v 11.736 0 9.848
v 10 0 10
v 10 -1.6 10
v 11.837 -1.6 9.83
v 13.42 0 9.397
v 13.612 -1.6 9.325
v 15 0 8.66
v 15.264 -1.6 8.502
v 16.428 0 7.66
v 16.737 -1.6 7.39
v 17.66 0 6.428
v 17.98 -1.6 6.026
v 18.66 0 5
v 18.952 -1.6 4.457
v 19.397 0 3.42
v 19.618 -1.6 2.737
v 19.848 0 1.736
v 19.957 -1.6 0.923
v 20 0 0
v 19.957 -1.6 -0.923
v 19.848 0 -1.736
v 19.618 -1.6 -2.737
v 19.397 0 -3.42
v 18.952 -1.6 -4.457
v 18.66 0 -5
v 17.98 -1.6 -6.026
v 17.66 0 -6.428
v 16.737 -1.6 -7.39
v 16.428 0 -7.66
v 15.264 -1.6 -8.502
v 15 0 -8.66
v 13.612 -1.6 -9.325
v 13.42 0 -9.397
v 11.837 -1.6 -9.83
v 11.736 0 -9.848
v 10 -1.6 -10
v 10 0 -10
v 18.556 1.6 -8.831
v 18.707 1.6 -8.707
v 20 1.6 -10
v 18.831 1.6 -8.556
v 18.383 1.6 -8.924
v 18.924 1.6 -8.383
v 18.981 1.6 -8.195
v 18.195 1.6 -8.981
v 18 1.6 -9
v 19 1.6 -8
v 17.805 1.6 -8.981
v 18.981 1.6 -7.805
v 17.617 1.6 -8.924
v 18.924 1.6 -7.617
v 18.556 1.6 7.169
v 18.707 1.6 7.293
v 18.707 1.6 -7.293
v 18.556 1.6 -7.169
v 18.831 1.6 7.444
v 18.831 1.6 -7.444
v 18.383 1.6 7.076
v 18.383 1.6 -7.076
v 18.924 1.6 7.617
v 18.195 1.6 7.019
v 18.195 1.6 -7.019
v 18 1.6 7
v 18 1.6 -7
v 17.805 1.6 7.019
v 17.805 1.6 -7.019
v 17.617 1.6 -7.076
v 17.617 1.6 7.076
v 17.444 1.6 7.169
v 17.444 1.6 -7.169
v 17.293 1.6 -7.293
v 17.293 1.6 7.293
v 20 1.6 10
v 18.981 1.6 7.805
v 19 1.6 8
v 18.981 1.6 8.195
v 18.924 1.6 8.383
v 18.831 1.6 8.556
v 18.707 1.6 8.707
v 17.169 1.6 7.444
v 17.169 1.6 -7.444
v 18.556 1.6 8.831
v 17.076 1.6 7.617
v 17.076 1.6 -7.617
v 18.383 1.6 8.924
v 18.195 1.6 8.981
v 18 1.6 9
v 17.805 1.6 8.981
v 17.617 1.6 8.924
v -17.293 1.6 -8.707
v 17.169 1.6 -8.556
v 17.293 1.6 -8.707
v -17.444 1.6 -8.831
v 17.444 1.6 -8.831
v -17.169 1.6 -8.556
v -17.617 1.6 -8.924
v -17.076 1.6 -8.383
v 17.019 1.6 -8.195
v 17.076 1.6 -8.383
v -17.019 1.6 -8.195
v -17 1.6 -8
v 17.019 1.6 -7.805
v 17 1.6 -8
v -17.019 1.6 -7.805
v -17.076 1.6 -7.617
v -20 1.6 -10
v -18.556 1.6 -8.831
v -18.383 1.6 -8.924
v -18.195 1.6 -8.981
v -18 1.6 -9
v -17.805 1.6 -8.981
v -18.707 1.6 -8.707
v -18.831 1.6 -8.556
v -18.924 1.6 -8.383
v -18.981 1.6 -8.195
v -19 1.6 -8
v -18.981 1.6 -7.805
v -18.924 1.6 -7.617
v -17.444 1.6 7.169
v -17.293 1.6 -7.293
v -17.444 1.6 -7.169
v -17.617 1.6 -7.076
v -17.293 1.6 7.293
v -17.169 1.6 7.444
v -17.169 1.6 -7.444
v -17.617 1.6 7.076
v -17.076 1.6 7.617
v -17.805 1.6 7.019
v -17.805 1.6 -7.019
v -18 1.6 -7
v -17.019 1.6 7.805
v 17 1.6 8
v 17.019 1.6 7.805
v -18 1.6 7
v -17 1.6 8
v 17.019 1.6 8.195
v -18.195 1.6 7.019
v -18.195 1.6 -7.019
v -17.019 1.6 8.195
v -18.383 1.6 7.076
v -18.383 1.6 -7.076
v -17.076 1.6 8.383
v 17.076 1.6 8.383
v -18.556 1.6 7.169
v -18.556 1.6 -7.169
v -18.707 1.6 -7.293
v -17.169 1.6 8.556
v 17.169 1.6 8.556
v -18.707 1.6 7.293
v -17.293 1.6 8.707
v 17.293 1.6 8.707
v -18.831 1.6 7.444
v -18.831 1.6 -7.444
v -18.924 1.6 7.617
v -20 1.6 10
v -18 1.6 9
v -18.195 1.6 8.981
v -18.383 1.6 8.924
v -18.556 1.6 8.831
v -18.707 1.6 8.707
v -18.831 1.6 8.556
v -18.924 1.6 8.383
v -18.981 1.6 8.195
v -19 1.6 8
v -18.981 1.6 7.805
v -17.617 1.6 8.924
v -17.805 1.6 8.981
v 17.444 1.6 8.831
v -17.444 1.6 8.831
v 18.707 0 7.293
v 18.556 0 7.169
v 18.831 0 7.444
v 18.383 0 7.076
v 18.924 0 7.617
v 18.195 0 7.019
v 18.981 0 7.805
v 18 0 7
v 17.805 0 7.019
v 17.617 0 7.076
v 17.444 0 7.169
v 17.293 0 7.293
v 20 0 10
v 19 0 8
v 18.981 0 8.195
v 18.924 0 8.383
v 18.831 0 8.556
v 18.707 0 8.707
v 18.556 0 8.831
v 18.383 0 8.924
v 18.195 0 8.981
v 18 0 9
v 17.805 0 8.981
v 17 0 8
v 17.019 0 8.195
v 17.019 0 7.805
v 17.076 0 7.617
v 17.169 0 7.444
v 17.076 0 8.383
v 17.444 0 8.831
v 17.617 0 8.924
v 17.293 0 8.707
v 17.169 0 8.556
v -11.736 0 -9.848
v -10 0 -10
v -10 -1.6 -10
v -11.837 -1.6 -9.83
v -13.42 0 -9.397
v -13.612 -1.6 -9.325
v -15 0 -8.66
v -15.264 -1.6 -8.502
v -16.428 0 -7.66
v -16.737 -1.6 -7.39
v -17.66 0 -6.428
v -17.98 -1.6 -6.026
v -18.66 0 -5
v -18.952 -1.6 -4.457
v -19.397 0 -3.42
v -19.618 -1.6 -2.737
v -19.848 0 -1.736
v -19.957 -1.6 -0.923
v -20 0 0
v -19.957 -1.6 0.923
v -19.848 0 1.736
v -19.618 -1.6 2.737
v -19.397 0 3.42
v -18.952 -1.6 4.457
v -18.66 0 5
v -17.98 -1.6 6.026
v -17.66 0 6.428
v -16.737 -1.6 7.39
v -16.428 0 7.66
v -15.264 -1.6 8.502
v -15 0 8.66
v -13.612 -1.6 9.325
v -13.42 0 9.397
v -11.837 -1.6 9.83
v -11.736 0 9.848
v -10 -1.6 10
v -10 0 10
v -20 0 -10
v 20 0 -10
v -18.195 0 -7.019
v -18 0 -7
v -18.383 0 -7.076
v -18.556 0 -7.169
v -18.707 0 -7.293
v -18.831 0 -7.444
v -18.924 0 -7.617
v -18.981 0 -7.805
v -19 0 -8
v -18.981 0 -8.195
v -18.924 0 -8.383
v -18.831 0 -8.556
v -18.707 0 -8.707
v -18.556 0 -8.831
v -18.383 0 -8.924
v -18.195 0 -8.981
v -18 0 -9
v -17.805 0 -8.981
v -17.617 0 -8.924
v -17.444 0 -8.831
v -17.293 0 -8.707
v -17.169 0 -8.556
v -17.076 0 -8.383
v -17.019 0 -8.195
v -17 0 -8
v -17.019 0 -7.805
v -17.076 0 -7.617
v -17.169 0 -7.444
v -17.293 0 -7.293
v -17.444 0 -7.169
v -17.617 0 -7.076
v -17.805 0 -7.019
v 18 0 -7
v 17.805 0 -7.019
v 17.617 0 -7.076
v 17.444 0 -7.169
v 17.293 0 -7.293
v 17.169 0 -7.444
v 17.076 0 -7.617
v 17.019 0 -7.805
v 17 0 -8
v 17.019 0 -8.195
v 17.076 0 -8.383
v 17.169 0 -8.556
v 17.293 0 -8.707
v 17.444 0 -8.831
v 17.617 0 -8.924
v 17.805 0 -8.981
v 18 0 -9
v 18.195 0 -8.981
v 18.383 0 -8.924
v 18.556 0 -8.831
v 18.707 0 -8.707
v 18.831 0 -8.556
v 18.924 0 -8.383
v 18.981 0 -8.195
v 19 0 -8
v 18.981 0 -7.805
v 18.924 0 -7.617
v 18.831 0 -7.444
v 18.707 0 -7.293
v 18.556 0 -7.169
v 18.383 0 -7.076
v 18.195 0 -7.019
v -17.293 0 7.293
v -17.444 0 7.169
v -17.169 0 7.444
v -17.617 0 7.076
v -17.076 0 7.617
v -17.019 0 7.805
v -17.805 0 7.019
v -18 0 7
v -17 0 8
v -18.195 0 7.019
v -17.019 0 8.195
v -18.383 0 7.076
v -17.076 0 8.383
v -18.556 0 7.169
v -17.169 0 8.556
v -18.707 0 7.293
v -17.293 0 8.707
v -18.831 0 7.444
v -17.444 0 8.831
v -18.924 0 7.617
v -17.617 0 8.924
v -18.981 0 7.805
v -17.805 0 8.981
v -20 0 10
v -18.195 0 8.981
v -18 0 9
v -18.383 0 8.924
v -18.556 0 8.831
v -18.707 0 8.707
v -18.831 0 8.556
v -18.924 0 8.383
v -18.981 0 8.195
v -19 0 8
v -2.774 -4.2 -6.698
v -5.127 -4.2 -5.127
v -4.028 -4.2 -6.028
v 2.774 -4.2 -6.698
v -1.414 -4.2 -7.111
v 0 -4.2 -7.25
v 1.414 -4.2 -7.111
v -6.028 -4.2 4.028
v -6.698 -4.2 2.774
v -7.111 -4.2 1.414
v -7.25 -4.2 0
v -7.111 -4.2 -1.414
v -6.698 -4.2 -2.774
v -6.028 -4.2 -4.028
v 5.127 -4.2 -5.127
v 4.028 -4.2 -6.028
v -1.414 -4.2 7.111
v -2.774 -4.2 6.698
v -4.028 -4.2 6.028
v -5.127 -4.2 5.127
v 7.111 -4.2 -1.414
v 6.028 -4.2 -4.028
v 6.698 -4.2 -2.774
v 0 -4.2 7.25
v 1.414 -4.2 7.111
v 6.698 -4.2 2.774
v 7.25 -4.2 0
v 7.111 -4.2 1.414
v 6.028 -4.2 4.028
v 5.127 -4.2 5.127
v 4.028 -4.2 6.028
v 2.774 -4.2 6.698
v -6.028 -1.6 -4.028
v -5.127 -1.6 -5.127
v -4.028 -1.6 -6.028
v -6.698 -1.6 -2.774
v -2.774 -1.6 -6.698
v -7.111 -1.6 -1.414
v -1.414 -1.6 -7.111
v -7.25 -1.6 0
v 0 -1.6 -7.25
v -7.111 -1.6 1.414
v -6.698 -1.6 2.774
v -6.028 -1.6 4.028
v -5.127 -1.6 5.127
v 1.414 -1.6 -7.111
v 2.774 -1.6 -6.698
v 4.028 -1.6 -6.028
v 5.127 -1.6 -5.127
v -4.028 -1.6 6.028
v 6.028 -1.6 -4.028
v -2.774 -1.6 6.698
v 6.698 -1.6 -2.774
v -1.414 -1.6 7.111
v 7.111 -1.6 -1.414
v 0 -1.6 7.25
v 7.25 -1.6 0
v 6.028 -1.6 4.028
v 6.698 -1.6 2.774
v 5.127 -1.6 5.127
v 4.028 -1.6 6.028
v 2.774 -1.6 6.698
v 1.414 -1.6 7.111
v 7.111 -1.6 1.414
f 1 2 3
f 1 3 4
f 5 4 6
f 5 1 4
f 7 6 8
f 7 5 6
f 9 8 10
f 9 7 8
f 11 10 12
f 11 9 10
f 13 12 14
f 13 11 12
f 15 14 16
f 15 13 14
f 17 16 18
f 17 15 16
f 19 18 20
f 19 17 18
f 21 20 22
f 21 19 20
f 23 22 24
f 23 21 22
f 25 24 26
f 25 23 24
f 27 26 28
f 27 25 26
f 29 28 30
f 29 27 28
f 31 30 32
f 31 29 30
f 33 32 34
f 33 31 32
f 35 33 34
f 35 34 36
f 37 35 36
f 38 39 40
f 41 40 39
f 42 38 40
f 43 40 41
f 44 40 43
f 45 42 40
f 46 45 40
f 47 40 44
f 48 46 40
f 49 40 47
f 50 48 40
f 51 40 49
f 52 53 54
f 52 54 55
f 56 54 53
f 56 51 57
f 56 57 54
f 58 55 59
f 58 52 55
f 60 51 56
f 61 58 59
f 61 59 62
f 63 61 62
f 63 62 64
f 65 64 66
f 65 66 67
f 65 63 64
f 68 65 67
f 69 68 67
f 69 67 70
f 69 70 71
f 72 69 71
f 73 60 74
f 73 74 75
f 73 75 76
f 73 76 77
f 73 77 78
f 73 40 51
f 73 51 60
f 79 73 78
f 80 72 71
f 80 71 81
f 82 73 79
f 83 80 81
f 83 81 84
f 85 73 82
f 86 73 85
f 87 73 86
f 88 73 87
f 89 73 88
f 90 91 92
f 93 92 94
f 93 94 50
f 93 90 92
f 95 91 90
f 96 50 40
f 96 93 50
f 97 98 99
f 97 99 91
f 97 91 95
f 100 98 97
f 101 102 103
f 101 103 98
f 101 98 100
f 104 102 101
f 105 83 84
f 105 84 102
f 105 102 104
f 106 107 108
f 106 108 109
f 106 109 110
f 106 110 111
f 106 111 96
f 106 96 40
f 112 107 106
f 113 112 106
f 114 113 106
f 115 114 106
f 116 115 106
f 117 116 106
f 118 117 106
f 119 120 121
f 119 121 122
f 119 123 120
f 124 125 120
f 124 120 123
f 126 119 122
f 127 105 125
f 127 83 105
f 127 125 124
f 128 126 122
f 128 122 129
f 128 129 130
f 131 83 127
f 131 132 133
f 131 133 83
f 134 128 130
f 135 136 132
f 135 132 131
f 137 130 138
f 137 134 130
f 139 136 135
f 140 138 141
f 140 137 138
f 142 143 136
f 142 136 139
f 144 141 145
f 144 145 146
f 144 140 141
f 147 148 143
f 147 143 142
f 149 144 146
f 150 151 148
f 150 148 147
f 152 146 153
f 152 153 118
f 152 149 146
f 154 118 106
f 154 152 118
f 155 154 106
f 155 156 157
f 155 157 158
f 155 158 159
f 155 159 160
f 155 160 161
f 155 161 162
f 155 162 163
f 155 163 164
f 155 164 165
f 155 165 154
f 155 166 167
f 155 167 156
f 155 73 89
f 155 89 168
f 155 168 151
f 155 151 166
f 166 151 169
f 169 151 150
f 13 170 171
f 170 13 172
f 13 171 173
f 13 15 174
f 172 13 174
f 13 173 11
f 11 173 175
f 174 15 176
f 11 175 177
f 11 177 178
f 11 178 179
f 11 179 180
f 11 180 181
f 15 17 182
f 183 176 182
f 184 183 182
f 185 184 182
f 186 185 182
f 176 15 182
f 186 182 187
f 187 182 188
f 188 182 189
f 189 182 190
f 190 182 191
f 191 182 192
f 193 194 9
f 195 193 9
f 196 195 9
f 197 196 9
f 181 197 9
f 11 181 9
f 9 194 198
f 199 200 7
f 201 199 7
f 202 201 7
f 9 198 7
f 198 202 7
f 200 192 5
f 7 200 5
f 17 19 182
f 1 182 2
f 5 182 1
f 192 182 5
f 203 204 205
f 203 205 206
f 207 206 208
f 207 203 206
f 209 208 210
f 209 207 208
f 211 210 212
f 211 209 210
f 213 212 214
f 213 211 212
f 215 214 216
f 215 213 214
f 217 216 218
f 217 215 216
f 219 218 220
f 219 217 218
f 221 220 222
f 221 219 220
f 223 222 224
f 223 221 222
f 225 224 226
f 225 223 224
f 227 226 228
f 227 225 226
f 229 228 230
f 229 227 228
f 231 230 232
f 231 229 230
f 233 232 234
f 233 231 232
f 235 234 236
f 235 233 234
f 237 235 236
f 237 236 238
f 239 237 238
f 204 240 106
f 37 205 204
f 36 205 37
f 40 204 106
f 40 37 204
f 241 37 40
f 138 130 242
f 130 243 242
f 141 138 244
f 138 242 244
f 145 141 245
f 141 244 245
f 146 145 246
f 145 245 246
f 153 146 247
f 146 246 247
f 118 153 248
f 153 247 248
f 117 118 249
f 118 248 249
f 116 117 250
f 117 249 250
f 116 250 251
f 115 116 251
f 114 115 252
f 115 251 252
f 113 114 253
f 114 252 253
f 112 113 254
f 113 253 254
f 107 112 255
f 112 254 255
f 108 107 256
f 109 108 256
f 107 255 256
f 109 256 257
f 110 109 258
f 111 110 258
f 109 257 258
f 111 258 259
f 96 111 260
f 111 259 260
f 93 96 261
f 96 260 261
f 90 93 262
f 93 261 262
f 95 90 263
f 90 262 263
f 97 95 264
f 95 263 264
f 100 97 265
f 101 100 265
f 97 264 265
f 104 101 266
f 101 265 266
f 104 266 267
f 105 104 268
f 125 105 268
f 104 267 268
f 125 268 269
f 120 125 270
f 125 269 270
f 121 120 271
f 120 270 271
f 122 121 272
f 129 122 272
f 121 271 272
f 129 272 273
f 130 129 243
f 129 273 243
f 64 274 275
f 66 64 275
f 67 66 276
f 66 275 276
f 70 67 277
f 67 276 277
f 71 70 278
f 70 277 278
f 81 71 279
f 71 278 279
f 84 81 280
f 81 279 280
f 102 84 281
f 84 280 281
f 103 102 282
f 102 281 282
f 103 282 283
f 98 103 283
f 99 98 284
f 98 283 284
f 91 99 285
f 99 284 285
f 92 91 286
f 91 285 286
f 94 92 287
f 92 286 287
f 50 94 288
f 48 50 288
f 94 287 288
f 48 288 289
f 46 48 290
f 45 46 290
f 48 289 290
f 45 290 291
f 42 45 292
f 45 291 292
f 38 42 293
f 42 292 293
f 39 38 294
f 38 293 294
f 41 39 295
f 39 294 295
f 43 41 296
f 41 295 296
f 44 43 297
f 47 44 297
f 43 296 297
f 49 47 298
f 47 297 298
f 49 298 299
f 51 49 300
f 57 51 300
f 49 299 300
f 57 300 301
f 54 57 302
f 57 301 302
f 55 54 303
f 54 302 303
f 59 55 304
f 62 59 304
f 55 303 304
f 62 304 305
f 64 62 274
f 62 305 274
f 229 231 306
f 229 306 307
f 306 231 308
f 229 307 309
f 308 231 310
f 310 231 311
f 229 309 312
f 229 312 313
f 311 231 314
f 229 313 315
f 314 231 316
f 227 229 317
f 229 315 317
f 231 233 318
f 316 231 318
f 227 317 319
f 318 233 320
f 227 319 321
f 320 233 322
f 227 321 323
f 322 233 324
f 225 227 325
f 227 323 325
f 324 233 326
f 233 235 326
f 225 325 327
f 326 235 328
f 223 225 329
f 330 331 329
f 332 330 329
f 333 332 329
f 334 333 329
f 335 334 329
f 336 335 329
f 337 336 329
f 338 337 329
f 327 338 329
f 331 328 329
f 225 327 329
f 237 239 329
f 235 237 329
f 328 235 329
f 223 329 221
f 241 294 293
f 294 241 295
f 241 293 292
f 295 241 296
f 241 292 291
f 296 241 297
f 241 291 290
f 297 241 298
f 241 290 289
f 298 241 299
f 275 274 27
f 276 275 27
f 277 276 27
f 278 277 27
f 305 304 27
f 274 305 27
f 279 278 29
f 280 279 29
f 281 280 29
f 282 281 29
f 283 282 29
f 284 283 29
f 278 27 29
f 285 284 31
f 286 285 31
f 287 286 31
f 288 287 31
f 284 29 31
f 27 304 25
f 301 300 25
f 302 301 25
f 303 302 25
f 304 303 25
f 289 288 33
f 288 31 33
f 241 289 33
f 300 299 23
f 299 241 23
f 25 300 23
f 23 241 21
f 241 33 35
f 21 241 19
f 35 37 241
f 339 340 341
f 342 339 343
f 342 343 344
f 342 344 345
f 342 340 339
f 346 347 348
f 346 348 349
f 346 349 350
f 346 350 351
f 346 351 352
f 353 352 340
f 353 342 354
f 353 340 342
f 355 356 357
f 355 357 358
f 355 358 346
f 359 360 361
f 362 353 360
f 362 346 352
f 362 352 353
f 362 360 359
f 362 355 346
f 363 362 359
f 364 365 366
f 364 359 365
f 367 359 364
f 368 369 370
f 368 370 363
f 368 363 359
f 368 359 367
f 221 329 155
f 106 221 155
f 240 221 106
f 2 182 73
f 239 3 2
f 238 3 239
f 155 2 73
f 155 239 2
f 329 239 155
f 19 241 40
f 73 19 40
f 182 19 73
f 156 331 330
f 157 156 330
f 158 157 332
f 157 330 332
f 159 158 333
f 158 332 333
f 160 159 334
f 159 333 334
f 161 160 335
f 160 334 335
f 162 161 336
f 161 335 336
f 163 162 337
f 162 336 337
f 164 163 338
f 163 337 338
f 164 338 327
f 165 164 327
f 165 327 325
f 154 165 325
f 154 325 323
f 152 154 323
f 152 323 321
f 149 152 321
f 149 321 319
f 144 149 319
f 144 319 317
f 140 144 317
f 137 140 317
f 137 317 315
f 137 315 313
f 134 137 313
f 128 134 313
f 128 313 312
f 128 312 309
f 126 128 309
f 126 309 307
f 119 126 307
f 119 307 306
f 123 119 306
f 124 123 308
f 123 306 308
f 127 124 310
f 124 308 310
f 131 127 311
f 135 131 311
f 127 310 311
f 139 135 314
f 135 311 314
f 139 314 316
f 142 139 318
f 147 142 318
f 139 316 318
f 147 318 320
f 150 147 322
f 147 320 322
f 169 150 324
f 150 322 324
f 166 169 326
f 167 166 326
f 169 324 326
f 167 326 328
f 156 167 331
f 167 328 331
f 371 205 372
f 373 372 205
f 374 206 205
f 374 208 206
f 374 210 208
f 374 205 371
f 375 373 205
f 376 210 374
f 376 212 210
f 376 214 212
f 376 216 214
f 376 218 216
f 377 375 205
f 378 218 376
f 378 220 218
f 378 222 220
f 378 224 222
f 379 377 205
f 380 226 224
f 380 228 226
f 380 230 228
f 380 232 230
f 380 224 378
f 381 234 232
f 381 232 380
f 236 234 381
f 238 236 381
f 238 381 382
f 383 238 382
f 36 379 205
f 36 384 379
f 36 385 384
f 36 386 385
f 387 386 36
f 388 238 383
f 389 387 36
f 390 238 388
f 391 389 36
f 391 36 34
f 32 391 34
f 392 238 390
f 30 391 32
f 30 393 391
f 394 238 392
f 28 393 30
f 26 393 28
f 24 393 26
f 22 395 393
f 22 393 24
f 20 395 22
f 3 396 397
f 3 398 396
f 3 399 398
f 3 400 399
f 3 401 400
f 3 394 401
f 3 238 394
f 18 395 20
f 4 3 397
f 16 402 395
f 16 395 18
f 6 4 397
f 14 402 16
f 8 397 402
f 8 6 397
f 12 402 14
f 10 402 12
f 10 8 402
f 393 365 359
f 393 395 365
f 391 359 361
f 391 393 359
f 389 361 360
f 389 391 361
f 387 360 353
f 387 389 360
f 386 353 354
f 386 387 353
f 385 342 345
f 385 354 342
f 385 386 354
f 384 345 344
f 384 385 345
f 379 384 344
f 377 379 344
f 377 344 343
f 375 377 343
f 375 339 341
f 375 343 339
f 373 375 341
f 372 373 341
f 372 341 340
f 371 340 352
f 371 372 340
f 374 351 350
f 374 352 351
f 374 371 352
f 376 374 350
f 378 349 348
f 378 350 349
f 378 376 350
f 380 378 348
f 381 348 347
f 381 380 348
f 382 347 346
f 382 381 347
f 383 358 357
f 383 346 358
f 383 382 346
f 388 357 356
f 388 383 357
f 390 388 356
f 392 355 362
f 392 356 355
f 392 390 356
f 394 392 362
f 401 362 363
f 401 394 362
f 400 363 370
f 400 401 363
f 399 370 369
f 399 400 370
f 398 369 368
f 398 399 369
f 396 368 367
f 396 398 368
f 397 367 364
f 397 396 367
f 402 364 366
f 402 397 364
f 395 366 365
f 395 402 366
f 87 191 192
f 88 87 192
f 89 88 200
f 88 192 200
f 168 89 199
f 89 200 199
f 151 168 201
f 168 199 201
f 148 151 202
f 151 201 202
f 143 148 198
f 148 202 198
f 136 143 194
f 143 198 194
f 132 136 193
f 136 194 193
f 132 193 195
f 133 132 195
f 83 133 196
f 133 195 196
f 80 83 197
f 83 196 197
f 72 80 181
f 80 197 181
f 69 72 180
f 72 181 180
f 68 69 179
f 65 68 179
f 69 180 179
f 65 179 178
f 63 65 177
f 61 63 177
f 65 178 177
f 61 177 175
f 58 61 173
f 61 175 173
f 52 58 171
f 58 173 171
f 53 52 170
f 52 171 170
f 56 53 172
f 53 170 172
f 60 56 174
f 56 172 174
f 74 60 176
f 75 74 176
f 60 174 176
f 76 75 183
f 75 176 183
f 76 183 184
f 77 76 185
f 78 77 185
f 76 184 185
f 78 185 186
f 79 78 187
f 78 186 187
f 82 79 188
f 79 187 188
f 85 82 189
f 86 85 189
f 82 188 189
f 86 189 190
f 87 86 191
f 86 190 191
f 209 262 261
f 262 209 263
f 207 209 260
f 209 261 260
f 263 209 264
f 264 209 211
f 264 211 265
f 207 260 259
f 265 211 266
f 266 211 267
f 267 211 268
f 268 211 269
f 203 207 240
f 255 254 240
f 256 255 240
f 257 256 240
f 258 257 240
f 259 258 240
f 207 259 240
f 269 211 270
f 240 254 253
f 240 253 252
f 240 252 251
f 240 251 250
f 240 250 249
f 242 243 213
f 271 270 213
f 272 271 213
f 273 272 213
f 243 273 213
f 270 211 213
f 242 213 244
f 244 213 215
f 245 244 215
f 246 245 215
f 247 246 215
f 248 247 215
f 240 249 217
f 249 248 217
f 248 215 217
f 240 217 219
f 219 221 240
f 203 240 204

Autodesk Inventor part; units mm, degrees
ref_plane "YZ Plane" through (0, 0, 0) normal (1, 0, 0) x (0, 1, 0)
ref_plane "XZ Plane" through (0, 0, 0) normal (0, 1, 0) x (-1, 0, 0)
ref_plane "XY Plane" through (0, 0, 0) normal (0, 0, 1) x (1, 0, 0)
sketch "Sketch1" plane through (0, 0, 0) normal (0, 1, 0) x (-1, 0, 0)
  line L0 (-20, 10) -> (20, 10)
  line L1 (20, 10) -> (20, -10)
  line L2 (20, -10) -> (-20, -10)
  line L3 (-20, -10) -> (-20, 10)
  point P0 (0, 0)
  dimension "d0" = 40
  dimension "d1" = 20
  dimension "d2" = 10
  dimension "d3" = 20
extrude "Extrusion1" add sketch "Sketch1" along normal blind 1.6
sketch "Sketch2" plane through (0, 0, 0) normal (0, -1, 0) x (1, 0, 0)
  line L0 (20, 10) -> (-20, 10) projected
  line L1 (-20, 10) -> (-20, -10) projected
  line L2 (-20, -10) -> (20, -10) projected
  line L3 (20, -10) -> (20, 10) projected
  line L4 (-10, 0) -> (10, 0) construction
  line L5 (-10, -10) -> (10, -10)
  line L6 (10, 10) -> (-10, 10)
  arc A0 (-10, 10) -> (-10, -10) centre (-10, 0) ccw
  arc A1 (10, -10) -> (10, 10) centre (10, 0) ccw
  point P0 (0, 0)
  point P1 (0, 0)
  dimension "d6" = 10
extrude "Extrusion2" add sketch "Sketch2" along normal blind 1.6 contours A1 L2 A0 L0
sketch "Sketch3" plane through (0, -1.6, 0) normal (0, -1, 0) x (1, 0, 0)
  circle A0 centre (0, 0) radius 7.25
  dimension "d9" = 14.5
extrude "Extrusion3" add sketch "Sketch3" along normal blind 2.6
sketch "Sketch4" plane through (0, 1.6, 0) normal (0, 1, 0) x (1, 0, 0)
  line L0 (-18, -8) -> (18, -8) construction
  line L1 (18, -8) -> (18, 8) construction
  line L2 (18, 8) -> (-18, 8) construction
  line L3 (-18, 8) -> (-18, -8) construction
  line L4 (-18, -8) -> (18, 8) construction
  line L5 (18, -8) -> (-18, 8) construction
  point P0 (0, 0)
  dimension "d12" = 36
  dimension "d13" = 16
hole "Hole1" at (-18, 1.6, -8) at (-18, 1.6, 8) at (18, 1.6, 8) at (18, 1.6, -8) direction (0, -1, 0) diameter 2 end through all
equation "\"d2\" = 0.5 * d1"
equation "\"d3\" = 0.5 * d0"
properties part number "speaker"
